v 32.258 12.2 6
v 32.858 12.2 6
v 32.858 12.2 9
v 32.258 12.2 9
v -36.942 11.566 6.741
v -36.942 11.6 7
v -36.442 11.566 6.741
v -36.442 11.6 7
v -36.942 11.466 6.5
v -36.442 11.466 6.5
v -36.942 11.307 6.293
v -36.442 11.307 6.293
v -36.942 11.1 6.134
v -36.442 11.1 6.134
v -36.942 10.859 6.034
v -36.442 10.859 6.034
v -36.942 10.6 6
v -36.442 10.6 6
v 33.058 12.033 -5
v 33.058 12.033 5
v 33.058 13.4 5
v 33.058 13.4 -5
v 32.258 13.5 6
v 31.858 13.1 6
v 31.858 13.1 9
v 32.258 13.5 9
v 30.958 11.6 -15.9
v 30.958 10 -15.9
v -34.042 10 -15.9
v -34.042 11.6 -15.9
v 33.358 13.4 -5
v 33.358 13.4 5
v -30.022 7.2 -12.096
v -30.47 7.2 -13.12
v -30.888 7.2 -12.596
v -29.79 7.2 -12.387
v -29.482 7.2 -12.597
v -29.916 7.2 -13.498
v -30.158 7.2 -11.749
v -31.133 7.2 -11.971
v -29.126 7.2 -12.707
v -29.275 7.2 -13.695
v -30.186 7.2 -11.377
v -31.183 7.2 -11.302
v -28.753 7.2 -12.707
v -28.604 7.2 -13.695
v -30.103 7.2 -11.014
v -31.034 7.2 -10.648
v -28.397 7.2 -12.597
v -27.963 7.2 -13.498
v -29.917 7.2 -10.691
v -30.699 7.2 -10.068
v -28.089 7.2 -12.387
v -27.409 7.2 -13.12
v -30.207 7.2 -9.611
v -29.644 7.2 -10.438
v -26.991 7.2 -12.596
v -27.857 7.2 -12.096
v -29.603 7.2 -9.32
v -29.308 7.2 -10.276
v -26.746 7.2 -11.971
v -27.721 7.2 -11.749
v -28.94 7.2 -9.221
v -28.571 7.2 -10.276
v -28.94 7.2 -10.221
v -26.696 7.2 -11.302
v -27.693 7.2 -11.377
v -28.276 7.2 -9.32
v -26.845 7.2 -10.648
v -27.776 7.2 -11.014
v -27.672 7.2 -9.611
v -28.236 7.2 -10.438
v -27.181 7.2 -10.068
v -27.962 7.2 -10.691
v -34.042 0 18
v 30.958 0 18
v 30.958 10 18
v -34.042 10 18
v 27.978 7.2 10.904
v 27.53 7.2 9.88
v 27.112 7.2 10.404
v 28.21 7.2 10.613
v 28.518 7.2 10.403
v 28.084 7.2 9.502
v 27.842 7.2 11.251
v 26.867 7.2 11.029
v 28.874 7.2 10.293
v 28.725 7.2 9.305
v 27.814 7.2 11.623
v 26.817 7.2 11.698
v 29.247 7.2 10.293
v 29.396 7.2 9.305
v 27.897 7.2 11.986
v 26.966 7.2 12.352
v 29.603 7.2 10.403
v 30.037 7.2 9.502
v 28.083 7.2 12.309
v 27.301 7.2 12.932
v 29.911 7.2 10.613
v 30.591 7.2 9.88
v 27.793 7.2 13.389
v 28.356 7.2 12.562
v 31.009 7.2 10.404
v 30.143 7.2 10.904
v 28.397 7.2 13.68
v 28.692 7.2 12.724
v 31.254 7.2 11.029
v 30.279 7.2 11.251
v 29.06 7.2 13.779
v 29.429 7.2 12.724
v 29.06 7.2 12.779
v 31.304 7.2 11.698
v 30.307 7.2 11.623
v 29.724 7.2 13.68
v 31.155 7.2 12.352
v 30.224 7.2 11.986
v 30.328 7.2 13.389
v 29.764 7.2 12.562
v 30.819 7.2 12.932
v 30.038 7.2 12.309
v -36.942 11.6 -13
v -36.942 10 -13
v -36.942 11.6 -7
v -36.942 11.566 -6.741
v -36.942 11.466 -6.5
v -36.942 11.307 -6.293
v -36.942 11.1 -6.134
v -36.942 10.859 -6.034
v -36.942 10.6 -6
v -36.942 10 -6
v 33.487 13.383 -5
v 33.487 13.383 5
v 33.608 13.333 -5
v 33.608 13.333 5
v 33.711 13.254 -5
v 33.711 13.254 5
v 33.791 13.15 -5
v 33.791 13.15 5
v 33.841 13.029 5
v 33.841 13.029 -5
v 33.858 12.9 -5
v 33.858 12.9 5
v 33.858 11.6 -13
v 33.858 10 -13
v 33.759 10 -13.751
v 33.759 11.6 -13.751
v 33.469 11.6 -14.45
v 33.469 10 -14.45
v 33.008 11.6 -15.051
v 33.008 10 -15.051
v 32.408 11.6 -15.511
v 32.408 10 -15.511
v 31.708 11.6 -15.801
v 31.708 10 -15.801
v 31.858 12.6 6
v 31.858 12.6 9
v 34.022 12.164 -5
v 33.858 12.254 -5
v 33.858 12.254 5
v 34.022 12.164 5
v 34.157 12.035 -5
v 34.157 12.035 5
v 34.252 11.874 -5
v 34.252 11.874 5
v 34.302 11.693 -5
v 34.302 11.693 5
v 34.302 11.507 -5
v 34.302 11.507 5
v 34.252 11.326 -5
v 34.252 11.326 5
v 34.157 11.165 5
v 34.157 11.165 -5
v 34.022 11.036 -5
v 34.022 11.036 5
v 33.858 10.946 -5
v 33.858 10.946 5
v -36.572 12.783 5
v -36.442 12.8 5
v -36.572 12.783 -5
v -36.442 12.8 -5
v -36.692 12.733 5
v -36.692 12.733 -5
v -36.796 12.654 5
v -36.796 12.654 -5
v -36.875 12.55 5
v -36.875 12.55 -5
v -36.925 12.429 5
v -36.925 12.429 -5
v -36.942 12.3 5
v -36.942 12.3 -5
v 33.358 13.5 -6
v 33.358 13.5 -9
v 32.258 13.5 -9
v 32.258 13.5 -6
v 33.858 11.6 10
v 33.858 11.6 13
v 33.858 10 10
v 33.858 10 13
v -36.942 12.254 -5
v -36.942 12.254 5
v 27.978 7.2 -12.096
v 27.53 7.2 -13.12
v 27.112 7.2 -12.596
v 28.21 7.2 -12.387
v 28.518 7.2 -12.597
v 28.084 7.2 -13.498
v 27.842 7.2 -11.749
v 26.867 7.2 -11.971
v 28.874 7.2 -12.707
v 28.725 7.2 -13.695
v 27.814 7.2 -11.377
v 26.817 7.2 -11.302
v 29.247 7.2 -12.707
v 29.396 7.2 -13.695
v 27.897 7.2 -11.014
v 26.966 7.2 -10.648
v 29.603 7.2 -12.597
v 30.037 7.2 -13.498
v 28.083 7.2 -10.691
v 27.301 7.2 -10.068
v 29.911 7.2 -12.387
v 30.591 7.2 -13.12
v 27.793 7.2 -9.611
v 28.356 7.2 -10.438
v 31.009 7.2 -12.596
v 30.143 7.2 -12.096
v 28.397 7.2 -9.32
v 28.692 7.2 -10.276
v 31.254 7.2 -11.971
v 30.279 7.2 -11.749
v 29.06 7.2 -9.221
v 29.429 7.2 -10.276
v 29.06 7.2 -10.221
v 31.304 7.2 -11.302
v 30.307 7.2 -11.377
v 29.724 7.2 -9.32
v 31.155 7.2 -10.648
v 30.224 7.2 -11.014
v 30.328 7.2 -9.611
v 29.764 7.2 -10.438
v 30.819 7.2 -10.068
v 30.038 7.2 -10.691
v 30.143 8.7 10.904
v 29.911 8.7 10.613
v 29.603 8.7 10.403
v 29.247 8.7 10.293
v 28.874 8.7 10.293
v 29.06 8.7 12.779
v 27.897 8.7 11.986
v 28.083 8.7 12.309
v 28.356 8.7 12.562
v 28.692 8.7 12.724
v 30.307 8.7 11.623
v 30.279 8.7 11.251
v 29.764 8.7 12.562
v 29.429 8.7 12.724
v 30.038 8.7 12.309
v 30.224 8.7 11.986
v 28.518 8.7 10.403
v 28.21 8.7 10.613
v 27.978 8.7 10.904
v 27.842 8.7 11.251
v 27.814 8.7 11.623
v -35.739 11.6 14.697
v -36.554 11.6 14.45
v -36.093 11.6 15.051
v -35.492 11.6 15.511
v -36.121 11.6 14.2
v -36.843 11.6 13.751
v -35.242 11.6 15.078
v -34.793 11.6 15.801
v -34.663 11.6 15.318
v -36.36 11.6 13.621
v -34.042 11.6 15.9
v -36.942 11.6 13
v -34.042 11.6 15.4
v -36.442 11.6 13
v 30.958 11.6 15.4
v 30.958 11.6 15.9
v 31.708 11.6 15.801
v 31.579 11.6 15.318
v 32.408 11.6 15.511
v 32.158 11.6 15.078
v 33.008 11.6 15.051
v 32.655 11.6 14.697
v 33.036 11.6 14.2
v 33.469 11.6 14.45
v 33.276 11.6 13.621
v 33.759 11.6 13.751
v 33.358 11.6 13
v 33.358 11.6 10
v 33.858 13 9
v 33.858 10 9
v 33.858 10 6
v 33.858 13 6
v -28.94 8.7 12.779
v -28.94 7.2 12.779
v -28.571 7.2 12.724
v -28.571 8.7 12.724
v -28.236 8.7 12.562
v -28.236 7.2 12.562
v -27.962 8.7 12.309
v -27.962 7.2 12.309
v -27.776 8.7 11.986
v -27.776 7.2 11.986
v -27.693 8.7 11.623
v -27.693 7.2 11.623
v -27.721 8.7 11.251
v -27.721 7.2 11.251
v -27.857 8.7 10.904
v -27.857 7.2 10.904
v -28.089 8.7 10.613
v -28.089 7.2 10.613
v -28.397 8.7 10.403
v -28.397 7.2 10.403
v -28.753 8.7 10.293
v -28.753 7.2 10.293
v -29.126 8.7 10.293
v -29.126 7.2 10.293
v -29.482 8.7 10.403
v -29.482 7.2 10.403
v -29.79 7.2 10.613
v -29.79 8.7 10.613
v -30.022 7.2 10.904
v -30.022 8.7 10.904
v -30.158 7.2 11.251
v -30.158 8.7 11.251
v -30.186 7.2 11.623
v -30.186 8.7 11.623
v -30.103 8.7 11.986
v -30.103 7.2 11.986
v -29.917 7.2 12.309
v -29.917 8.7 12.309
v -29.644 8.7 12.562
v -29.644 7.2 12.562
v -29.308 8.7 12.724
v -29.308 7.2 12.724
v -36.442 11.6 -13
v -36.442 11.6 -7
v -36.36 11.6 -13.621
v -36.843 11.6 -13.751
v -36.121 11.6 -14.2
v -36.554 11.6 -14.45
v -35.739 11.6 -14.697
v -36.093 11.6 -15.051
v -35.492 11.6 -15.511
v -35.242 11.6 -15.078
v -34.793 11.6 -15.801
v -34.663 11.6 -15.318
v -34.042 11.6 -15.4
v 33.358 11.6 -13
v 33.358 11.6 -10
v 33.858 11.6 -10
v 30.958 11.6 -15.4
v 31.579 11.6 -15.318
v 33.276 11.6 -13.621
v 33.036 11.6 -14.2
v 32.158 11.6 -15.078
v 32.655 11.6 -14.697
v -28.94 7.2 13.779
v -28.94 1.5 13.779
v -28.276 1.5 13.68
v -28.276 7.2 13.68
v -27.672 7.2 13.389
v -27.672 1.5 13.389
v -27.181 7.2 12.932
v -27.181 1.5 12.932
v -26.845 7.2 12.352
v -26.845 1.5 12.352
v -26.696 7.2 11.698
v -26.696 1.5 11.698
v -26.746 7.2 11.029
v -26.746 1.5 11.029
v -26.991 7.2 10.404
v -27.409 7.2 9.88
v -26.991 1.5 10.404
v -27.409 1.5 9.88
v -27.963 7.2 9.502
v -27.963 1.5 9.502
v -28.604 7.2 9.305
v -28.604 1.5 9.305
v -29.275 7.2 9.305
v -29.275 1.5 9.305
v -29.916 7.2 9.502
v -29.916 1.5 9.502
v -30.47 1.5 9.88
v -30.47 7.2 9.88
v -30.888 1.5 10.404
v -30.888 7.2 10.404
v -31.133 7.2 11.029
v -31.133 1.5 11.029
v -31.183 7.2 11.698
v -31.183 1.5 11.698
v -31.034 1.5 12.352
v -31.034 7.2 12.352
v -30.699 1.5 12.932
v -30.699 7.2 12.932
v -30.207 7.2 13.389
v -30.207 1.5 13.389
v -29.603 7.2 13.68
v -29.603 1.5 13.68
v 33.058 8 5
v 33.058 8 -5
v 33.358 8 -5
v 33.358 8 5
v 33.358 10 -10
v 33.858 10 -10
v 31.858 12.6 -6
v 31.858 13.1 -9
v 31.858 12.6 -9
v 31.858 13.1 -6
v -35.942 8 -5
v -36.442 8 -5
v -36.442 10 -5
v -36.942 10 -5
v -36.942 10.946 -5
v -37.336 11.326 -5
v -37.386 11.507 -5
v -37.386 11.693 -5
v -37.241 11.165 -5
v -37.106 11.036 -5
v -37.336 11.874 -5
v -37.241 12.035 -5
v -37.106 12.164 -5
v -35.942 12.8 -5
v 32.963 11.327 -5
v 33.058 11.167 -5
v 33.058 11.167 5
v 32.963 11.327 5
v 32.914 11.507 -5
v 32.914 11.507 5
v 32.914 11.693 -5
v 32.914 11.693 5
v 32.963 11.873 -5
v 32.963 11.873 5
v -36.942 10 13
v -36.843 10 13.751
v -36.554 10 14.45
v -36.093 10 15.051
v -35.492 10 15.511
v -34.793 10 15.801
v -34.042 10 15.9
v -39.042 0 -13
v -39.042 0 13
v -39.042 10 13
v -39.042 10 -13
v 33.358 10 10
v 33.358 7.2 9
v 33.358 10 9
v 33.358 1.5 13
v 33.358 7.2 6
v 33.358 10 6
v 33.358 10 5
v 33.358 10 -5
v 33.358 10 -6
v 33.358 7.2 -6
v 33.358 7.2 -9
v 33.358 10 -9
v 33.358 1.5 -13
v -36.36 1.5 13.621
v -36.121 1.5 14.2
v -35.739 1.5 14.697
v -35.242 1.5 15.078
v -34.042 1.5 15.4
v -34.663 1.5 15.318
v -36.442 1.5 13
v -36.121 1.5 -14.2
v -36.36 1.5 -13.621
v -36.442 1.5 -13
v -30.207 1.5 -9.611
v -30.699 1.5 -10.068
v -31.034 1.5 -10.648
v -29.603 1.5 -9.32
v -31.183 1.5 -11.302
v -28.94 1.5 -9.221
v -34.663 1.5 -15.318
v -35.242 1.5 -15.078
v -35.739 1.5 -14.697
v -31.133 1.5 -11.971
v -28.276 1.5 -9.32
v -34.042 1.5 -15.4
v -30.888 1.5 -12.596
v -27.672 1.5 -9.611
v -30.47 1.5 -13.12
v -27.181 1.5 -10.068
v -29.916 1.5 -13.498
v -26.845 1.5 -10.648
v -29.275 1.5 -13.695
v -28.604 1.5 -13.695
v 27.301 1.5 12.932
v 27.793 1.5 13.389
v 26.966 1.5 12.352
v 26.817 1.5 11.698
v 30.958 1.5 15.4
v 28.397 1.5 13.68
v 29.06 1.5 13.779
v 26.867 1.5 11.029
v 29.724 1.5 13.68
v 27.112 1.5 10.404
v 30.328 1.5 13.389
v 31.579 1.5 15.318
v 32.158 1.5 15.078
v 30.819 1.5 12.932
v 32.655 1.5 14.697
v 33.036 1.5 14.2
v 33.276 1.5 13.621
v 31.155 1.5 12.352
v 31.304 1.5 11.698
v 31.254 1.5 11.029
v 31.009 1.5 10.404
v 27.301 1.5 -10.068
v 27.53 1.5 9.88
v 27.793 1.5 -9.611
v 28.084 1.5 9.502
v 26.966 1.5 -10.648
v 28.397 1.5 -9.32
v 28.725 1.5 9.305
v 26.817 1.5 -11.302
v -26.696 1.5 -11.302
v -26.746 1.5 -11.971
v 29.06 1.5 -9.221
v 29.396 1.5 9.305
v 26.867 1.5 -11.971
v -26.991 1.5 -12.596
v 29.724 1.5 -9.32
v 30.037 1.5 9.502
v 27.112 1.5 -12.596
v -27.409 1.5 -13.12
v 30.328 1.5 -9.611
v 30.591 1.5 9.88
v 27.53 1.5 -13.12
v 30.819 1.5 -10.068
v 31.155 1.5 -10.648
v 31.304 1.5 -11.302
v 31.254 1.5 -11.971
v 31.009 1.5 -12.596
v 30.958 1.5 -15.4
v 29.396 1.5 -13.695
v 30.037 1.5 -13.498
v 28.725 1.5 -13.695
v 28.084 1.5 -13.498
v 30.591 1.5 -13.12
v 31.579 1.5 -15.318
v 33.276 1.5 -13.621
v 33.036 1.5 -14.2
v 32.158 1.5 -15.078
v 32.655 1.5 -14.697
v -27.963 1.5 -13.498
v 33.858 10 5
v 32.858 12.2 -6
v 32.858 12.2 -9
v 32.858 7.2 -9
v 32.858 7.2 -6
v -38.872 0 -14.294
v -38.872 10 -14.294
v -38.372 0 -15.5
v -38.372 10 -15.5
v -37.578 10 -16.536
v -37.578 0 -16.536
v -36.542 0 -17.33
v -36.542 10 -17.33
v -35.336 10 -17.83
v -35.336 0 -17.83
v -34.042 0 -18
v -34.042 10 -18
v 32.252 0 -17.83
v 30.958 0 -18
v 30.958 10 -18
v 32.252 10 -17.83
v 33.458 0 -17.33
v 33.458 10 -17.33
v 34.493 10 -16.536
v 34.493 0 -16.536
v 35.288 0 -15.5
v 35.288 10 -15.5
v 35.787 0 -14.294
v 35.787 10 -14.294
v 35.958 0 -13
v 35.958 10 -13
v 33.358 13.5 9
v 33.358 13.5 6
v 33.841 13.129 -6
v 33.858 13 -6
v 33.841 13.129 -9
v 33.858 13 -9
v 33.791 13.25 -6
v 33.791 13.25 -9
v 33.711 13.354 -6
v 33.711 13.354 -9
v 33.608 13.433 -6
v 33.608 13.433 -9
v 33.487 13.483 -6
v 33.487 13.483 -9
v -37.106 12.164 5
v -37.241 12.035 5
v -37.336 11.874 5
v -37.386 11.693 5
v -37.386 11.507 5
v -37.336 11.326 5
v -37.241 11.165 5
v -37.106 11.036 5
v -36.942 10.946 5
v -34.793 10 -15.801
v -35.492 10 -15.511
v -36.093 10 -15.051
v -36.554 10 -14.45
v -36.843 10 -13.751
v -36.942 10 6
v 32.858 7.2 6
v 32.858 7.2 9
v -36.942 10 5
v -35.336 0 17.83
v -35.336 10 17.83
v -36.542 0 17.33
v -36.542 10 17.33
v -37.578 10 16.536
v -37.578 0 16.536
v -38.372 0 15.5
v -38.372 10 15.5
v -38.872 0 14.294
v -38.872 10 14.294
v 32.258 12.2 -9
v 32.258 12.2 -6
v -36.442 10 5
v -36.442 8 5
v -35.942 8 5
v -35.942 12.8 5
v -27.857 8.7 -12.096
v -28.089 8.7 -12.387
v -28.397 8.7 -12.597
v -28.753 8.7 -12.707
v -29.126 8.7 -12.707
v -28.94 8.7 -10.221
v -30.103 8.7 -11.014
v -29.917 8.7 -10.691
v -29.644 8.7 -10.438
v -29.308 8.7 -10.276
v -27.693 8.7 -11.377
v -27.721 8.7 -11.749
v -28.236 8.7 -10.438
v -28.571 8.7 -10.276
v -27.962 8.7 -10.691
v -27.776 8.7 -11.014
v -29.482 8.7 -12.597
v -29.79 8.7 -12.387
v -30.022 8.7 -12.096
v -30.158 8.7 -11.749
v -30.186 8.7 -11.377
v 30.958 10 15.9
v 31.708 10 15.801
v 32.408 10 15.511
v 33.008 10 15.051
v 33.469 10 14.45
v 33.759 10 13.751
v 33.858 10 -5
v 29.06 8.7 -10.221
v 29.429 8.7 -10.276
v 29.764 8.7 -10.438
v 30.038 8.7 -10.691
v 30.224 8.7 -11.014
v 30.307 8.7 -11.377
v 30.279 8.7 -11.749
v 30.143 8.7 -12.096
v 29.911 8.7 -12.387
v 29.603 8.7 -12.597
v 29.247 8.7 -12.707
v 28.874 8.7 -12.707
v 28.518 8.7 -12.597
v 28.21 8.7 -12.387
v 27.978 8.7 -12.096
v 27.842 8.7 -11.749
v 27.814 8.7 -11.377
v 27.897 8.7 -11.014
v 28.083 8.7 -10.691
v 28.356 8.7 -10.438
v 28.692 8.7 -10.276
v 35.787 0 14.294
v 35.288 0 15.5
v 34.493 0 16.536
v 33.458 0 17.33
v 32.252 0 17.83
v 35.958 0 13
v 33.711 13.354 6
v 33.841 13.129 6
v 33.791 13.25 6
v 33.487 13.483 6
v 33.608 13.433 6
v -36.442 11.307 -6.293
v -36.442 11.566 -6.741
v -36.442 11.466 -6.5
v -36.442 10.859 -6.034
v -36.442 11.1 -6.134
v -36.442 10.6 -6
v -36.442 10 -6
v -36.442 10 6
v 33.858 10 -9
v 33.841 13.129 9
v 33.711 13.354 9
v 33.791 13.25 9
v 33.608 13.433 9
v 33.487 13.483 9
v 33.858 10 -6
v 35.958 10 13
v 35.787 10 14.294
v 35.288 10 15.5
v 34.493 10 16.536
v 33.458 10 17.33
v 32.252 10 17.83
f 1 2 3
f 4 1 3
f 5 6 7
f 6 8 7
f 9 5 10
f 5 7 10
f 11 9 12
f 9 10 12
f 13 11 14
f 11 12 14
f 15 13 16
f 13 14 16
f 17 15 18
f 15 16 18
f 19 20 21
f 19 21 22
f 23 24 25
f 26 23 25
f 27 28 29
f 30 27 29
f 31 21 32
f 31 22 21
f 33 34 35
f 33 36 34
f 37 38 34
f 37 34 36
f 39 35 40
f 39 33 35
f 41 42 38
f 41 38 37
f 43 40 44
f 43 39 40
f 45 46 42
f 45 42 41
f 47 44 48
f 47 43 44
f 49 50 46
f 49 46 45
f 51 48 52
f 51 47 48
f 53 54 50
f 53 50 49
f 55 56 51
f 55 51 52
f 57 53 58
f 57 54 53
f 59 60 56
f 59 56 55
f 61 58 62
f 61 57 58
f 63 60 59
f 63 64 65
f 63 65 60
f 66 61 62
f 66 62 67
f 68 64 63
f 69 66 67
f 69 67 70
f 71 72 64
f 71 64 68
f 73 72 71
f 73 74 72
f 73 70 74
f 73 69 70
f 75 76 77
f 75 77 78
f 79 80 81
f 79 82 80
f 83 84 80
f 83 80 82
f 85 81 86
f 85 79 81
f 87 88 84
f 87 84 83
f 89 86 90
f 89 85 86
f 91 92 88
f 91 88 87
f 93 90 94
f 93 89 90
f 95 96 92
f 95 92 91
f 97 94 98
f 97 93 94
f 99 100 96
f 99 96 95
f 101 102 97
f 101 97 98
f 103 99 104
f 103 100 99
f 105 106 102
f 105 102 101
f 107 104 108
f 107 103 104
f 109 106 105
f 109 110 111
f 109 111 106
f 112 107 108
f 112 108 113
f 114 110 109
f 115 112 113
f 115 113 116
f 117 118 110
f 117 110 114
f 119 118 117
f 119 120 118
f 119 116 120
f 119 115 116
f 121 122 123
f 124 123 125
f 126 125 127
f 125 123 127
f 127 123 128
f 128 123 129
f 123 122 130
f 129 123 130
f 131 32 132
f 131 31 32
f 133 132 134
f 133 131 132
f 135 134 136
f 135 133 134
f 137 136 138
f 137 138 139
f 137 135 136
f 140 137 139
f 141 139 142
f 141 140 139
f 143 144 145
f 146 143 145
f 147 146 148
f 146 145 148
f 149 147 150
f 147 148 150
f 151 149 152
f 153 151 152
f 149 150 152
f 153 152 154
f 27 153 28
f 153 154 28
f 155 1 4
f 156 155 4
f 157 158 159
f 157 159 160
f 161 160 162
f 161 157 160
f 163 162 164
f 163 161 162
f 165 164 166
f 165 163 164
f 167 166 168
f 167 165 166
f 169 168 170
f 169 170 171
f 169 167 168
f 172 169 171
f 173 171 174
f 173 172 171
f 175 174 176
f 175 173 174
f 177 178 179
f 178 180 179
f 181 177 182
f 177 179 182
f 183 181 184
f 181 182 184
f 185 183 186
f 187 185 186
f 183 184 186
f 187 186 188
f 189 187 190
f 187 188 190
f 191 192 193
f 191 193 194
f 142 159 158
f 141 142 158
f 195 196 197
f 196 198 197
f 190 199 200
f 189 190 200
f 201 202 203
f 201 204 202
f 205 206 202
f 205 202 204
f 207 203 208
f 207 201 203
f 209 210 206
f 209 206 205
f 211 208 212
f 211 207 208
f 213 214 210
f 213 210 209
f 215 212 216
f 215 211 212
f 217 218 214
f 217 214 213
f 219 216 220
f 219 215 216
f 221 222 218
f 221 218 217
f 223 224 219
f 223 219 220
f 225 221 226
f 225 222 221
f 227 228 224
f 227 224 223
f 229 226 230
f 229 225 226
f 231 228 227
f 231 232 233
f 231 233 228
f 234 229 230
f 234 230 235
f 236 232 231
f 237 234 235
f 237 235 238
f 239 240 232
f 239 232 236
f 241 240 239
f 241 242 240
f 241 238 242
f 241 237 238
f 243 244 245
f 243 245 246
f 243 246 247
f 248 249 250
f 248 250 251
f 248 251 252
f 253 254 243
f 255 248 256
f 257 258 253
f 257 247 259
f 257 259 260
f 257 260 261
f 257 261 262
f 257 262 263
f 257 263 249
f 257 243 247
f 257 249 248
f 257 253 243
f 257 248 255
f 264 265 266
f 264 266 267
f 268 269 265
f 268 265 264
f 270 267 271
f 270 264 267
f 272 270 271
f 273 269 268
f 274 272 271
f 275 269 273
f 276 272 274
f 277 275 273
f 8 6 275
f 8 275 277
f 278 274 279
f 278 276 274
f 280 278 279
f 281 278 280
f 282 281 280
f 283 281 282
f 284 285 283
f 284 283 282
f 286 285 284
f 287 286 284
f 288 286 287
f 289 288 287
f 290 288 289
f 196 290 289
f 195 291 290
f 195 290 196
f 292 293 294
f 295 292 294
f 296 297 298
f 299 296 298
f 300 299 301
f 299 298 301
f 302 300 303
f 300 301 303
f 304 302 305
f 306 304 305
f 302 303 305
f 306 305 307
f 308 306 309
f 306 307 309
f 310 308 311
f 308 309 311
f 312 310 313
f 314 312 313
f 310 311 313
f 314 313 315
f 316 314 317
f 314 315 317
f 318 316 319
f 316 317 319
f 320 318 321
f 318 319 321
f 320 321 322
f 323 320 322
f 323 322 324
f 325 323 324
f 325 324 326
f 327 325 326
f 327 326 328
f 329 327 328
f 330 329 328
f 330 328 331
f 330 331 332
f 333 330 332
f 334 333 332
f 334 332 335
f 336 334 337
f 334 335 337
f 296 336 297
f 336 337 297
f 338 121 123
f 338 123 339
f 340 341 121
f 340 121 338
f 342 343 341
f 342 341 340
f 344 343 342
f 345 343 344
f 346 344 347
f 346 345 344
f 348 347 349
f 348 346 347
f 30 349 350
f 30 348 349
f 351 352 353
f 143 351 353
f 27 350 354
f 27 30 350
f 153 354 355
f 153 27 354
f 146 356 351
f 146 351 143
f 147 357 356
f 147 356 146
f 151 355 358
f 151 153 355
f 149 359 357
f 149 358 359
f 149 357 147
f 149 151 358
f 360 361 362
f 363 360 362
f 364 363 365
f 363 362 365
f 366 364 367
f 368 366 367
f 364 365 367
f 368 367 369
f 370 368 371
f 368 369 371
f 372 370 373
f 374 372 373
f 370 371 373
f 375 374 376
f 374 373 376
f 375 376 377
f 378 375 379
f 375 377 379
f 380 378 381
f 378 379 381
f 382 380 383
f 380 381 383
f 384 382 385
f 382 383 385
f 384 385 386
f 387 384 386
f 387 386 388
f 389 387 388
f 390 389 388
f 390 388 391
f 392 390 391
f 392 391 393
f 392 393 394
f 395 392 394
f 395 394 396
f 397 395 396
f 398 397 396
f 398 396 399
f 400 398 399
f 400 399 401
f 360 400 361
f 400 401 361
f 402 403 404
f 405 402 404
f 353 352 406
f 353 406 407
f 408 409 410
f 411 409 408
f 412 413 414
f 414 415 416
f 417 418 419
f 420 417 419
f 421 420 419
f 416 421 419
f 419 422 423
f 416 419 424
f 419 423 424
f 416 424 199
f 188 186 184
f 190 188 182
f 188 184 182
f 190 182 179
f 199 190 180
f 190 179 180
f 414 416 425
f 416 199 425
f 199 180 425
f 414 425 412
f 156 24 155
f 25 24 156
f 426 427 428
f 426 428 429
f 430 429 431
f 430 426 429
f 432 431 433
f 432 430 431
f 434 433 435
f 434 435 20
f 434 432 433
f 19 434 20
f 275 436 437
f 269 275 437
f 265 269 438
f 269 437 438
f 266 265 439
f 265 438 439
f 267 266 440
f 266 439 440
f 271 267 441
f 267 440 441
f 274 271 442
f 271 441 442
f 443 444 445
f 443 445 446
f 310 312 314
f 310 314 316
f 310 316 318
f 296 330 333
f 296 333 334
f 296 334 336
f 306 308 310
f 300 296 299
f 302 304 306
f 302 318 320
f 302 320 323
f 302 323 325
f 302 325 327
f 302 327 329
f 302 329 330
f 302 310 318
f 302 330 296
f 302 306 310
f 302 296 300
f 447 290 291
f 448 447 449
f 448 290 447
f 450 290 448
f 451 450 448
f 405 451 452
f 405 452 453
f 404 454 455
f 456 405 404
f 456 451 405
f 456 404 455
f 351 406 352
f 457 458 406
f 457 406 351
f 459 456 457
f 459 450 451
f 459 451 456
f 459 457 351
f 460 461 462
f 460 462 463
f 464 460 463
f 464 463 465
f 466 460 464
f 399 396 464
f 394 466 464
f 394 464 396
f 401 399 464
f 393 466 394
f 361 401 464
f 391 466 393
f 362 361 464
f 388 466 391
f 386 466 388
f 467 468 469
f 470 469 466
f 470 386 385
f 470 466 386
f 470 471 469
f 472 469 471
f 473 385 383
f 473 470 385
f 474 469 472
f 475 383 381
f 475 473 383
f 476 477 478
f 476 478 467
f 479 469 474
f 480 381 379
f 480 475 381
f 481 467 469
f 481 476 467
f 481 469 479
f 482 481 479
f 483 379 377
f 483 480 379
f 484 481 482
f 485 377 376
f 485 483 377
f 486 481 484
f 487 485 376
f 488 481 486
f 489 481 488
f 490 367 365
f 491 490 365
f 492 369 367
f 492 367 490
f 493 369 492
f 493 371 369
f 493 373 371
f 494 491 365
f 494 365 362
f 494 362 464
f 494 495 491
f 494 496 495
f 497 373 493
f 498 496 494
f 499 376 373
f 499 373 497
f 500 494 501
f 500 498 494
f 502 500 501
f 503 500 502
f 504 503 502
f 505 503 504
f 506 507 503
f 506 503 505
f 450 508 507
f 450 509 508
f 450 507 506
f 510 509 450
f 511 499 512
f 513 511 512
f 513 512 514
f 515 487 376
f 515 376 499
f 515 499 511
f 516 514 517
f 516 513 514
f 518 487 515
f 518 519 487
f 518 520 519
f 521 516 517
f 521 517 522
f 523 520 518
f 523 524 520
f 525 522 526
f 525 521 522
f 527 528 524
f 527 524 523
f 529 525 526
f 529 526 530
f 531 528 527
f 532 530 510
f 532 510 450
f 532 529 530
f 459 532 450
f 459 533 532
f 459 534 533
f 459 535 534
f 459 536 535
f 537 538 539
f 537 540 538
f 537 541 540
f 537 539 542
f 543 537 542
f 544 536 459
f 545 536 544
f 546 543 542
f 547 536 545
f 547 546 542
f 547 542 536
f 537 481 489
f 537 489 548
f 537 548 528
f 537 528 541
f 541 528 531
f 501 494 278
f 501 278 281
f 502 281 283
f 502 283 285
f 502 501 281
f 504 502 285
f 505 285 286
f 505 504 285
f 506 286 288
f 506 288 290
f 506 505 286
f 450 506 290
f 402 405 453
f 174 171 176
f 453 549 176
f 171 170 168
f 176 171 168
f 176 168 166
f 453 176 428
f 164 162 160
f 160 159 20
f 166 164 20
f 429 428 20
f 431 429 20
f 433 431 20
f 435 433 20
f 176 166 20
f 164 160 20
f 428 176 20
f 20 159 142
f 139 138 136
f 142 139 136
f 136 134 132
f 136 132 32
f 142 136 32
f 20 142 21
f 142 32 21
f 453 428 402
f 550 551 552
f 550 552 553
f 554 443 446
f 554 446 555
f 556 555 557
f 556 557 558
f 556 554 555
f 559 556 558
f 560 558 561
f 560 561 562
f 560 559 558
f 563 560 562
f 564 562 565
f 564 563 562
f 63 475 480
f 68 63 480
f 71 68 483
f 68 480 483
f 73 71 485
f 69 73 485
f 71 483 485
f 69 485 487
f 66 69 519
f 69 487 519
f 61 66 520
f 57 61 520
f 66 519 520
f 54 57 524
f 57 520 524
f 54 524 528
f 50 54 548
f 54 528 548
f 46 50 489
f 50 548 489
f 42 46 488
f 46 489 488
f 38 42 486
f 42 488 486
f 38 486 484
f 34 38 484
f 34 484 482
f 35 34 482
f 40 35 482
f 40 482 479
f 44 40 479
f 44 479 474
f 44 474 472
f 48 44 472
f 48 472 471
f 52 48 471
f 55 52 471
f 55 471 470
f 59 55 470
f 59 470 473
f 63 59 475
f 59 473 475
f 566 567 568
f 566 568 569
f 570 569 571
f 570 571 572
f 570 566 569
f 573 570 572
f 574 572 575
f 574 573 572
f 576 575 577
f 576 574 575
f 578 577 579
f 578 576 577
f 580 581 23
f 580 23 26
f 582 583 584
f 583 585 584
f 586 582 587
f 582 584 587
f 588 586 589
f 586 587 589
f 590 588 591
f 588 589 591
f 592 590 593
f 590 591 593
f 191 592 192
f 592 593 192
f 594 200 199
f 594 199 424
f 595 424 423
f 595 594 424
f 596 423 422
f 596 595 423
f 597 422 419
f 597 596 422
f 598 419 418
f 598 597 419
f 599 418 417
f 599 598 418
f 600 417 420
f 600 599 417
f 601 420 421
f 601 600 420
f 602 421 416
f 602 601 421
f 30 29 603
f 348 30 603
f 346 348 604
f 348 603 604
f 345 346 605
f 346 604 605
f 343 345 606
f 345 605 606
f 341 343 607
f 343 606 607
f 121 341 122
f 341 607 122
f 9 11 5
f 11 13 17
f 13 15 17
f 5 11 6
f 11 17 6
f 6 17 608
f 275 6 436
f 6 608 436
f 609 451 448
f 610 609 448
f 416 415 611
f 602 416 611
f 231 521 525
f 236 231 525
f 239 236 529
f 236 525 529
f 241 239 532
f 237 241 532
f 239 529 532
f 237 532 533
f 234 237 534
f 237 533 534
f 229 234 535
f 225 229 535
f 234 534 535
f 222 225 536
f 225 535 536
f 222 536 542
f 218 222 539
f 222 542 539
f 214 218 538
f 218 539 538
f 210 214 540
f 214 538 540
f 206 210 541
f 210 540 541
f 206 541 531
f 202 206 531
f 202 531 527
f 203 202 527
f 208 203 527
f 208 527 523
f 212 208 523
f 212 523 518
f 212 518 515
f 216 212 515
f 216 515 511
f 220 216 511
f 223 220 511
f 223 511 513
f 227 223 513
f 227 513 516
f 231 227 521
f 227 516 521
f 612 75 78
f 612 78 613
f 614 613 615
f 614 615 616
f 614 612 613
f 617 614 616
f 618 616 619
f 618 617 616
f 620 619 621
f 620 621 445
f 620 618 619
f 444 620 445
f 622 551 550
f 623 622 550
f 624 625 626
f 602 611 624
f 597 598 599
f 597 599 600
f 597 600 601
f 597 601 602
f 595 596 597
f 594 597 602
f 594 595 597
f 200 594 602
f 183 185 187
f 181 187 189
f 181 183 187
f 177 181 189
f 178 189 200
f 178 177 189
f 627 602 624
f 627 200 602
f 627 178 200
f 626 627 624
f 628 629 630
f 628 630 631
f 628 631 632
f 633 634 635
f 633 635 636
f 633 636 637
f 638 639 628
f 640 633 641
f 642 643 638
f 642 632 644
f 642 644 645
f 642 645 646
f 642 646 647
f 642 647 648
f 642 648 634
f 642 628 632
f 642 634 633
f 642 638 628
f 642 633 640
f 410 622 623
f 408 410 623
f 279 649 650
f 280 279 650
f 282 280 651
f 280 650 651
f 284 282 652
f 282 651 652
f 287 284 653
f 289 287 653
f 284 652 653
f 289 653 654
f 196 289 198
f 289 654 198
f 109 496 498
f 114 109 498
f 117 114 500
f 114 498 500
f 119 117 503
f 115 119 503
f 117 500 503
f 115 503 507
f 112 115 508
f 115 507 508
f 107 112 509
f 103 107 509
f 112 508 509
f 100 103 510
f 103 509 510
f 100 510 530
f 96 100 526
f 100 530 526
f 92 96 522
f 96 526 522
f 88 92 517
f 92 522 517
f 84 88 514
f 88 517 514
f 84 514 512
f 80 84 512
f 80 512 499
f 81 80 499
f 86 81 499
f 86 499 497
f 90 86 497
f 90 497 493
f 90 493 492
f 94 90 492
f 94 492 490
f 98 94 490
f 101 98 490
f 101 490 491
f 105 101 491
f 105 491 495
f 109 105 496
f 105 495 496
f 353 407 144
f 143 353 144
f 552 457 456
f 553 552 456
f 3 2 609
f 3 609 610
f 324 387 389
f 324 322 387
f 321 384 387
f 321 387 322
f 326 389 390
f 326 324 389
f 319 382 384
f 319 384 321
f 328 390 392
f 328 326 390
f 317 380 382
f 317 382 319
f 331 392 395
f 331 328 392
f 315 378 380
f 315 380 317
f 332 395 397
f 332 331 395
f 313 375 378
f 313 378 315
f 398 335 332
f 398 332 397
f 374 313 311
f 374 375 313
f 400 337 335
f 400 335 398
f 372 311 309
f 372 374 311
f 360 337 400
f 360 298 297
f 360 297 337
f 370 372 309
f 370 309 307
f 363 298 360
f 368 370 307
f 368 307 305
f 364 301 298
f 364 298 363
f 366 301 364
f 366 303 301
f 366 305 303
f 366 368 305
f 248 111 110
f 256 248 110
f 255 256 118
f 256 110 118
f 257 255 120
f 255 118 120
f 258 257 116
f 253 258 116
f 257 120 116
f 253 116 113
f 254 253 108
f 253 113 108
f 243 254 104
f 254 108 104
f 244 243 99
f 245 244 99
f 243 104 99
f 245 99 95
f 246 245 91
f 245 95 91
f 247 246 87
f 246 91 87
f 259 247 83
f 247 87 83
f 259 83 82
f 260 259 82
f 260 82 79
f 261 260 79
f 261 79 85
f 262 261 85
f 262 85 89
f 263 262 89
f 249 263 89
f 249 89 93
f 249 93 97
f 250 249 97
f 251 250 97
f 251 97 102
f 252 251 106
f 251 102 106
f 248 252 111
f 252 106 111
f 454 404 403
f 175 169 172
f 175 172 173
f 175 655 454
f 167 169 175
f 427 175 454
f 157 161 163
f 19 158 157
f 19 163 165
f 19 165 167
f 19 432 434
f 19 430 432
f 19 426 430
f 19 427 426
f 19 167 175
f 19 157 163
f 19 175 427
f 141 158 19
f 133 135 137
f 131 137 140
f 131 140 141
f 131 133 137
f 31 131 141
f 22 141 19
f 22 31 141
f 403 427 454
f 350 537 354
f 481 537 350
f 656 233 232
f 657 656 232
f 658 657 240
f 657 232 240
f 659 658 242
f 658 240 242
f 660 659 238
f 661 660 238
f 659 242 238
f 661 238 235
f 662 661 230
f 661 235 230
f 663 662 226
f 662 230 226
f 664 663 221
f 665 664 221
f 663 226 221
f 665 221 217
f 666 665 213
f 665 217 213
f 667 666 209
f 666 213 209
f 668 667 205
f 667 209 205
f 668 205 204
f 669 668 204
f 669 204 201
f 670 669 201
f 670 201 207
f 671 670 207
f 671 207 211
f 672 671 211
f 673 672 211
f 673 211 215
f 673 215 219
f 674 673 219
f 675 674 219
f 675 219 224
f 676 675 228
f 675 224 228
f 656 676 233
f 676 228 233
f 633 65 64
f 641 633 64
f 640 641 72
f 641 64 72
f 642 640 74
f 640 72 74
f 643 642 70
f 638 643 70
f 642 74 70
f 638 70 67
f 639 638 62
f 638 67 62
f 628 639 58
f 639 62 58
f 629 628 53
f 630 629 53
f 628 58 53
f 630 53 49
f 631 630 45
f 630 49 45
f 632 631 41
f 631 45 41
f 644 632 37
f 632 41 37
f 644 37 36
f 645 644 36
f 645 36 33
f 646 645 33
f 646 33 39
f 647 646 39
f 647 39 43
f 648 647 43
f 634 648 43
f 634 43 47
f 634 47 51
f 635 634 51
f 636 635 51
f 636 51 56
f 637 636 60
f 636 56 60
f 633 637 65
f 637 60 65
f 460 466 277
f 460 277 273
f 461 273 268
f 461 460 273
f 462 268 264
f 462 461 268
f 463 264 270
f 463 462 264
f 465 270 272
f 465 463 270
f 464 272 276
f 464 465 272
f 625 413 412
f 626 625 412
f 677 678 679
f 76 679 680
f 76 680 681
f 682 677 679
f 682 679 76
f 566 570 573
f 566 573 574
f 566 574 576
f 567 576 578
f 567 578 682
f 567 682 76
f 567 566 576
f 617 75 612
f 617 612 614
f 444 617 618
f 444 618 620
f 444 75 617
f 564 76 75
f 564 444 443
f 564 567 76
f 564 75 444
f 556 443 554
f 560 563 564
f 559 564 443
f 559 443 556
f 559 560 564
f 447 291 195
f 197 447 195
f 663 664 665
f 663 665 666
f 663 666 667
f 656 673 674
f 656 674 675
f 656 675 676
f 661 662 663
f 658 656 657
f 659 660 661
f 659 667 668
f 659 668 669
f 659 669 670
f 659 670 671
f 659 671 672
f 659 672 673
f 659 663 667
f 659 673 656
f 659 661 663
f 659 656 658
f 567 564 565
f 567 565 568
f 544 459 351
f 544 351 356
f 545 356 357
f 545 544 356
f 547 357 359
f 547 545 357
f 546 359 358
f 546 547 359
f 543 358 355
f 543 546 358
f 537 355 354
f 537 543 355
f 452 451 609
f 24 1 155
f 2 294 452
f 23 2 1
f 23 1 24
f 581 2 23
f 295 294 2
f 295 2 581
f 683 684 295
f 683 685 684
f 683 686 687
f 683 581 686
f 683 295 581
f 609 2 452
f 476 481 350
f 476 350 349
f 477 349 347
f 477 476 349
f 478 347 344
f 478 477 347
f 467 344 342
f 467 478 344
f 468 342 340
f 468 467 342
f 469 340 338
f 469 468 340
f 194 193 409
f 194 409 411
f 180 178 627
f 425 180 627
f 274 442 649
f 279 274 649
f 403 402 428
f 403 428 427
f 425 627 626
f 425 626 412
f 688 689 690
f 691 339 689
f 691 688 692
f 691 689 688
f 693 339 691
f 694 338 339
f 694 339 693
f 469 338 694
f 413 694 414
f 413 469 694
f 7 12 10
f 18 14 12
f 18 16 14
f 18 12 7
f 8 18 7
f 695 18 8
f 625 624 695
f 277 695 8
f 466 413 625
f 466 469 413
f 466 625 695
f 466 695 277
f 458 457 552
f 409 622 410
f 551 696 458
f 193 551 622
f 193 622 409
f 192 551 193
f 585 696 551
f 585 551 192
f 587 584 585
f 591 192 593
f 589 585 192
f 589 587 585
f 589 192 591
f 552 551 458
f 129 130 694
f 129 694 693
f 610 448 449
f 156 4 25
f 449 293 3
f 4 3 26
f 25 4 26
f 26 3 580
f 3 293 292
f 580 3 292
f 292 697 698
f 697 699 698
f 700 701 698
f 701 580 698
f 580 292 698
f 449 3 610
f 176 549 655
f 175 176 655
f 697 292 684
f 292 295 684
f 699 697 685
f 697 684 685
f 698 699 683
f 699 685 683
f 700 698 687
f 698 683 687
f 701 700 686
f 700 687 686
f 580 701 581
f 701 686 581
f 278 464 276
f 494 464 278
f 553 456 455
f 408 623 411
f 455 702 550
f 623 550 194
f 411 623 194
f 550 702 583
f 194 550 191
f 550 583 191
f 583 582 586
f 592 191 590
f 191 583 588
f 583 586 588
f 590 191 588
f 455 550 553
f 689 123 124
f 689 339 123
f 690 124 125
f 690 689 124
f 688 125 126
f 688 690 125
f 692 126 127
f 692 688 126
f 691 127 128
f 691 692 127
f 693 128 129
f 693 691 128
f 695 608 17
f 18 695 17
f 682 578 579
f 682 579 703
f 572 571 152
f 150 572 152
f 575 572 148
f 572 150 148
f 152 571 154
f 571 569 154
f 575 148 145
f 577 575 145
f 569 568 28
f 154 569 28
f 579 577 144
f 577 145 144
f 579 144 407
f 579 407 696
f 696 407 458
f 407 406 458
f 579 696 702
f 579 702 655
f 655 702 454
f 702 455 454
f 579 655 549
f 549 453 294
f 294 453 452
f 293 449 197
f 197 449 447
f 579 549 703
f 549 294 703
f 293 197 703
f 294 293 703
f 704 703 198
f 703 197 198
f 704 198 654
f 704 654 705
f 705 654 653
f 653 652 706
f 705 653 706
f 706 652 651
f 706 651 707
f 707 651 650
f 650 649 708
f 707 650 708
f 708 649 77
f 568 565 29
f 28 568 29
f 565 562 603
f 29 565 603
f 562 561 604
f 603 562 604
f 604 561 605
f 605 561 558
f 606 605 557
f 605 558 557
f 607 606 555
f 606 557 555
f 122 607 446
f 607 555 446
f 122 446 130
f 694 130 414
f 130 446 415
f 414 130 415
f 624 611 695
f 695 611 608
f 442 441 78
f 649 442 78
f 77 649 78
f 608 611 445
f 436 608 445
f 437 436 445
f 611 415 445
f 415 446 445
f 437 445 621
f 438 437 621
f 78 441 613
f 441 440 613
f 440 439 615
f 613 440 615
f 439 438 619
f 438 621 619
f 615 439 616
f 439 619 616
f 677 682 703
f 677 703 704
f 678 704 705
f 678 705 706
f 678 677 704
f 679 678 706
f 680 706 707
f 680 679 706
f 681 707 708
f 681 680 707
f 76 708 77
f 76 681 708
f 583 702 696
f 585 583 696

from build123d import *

# Parameters (mm, degrees)
EXTRUDE_2_DEPTH       = 10
EXTRUDE_4_DEPTH       = 1.6
SKETCH_7_W            = 0.5
SKETCH_7_H            = 10
EXTRUDE_8_DEPTH       = 2.8
SKETCH_8_R            = 0.7
EXTRUDE_9_DEPTH       = 10
FILLET_1_R            = 0.5
SKETCH_11_W           = 1
SKETCH_11_H           = 1.6
CUT_EXTRUDE_1_DEPTH   = 1.2
FILLET_2_R            = 1
SKETCH_13_W           = 0.5
SKETCH_13_H           = 10
EXTRUDE_10_DEPTH      = 2.8
CUT_EXTRUDE_START     = -8.5
CUT_EXTRUDE_2_DEPTH   = 8.5
SKETCH_13_2_W         = 0.5
SKETCH_13_2_H         = 10
EXTRUDE_11_DEPTH      = 2
EXTRUDE_12_DEPTH      = 1.6
EXTRUDE_12_DEPTH_BACK = 2
SKETCH_5_W            = 0.3
SKETCH_5_H            = 10
SKETCH_15_R           = 2.25
EXTRUDE_13_DEPTH      = 5.7
SKETCH_16_R           = 1.25
EXTRUDE_14_DEPTH      = 1.5
SKETCH_17_W           = 0.5
SKETCH_17_H           = 1
CUT_EXTRUDE_3_DEPTH   = 1.6
SKETCH_19_W           = 0.8
SKETCH_19_H           = 10
EXTRUDE_15_DEPTH      = 1.8
SKETCH_20_R           = 0.7
EXTRUDE_16_DEPTH      = 10
FILLET_4_R            = 0.5
SKETCH_21_W           = 0.5
SKETCH_21_H           = 3
EXTRUDE_17_DEPTH      = 1.9
SKETCH_22_W           = 3
SKETCH_22_H           = 6.3
EXTRUDE_23_DEPTH      = 0.5
FILLET_12_R           = 0.5
SKETCH_29_W           = 0.5
SKETCH_29_H           = 1
CUT_EXTRUDE_5_DEPTH   = 1.6
SKETCH_30_W           = 3
SKETCH_30_H           = 1.3
EXTRUDE_26_DEPTH      = 1
CHAMFER_7_SIZE        = 0.4


with BuildPart() as part:
    # case 2 → 凸台-拉伸2 (new body)
    with BuildSketch(Plane(origin=(0, 0, 0), x_dir=(1, 0, 0), z_dir=(0, 1, 0))):
        with BuildLine():
            Line((-34.042196447, 18), (30.957803553, 18))
            ThreePointArc((30.957803553, 18), (34.493337459, 16.535533906), (35.957803553, 13))
            Line((35.957803553, 13), (35.957803553, -13))
            ThreePointArc((35.957803553, -13), (34.493337459, -16.535533906), (30.957803553, -18))
            Line((30.957803553, -18), (-34.042196447, -18))
            ThreePointArc((-34.042196447, -18), (-37.577730353, -16.535533906), (-39.042196447, -13))
            Line((-39.042196447, -13), (-39.042196447, 13))
            ThreePointArc((-39.042196447, 13), (-37.577730353, 16.535533906), (-34.042196447, 18))
        make_face()
    extrude(amount=EXTRUDE_2_DEPTH)

    # 草图3 → 凸台-拉伸4 (add)
    with BuildSketch(Plane(origin=(0, 10, 0), x_dir=(1, 0, 0), z_dir=(0, 1, 0))):
        with BuildLine():
            Line((-36.942196447, 13), (-36.942196447, -13))
            ThreePointArc((-36.942196447, -13), (-36.092806113, -15.050609665), (-34.042196447, -15.9))
            Line((-34.042196447, -15.9), (30.957803553, -15.9))
            ThreePointArc((30.957803553, -15.9), (33.008413218, -15.050609665), (33.857803553, -13))
            Line((33.857803553, -13), (33.857803553, 13))
            ThreePointArc((33.857803553, 13), (33.008413218, 15.050609665), (30.957803553, 15.9))
            Line((30.957803553, 15.9), (-34.042196447, 15.9))
            ThreePointArc((-34.042196447, 15.9), (-36.092806113, 15.050609665), (-36.942196447, 13))
        make_face()
        with BuildLine():
            Line((-34.042196447, -15.4), (30.957803553, -15.4))
            ThreePointArc((30.957803553, -15.4), (32.654859828, -14.697056275), (33.357803553, -13))
            Line((33.357803553, -13), (33.357803553, 13))
            ThreePointArc((33.357803553, 13), (32.654859828, 14.697056275), (30.957803553, 15.4))
            Line((30.957803553, 15.4), (-34.042196447, 15.4))
            ThreePointArc((-34.042196447, 15.4), (-35.739252722, 14.697056275), (-36.442196447, 13))
            Line((-36.442196447, 13), (-36.442196447, -13))
            ThreePointArc((-36.442196447, -13), (-35.739252722, -14.697056275), (-34.042196447, -15.4))
        make_face(mode=Mode.SUBTRACT)
    extrude(amount=EXTRUDE_4_DEPTH)

    # 草图7 → 凸台-拉伸8 (add)
    with BuildSketch(Plane(origin=(0, 10, 0), x_dir=(1, 0, 0), z_dir=(0, 1, 0))):
        with Locations((-36.692196447, 0)):
            Rectangle(SKETCH_7_W, SKETCH_7_H)
    extrude(amount=EXTRUDE_8_DEPTH)

    # 草图8 → 凸台-拉伸9 (add)
    with BuildSketch(Plane.XY.offset(5)):
        with Locations((-36.692196447, 11.6)):
            Circle(SKETCH_8_R)
    extrude(amount=-EXTRUDE_9_DEPTH)

    # 圆角1
    fillet_1_edges = [part.edges().sort_by_distance(p)[0] for p in [
        (-36.942196447, 12.8, 0),
    ]]
    fillet(fillet_1_edges, radius=FILLET_1_R - 0.0001)  # a hair under: the kernel refuses the full size

    # 草图11 → 切除-拉伸1 (cut)
    with BuildSketch(Plane.ZY.offset(36.942196447)):
        with Locations((5.5, 10.8)):
            Rectangle(SKETCH_11_W, SKETCH_11_H)
        with Locations((-5.5, 10.8)):
            Rectangle(SKETCH_11_W, SKETCH_11_H)
    extrude(amount=-CUT_EXTRUDE_1_DEPTH, mode=Mode.SUBTRACT)

    # 圆角2
    fillet_2_edges = [part.edges().sort_by_distance(p)[0] for p in [
        (-36.692196447, 11.6, 6),
        (-36.692196447, 11.6, -6),
    ]]
    fillet(fillet_2_edges, radius=FILLET_2_R)

    # 草图13 → 凸台-拉伸10 (add)
    with BuildSketch(Plane(origin=(0, 10, 0), x_dir=(1, 0, 0), z_dir=(0, 1, 0))):
        with Locations((-36.192196447, 0)):
            Rectangle(SKETCH_13_W, SKETCH_13_H)
    extrude(amount=EXTRUDE_10_DEPTH)

    # 草图14 → 切除-拉伸2 (cut)
    with BuildSketch(Plane(origin=(0, 10, 0), x_dir=(1, 0, 0), z_dir=(0, 1, 0)).offset(CUT_EXTRUDE_START)):
        with BuildLine():
            Line((-34.042196447, -15.4), (30.957803553, -15.4))
            ThreePointArc((30.957803553, -15.4), (32.654859828, -14.697056275), (33.357803553, -13))
            Line((33.357803553, -13), (33.357803553, 13))
            ThreePointArc((33.357803553, 13), (32.654859828, 14.697056275), (30.957803553, 15.4))
            Line((30.957803553, 15.4), (-34.042196447, 15.4))
            ThreePointArc((-34.042196447, 15.4), (-35.739252722, 14.697056275), (-36.442196447, 13))
            Line((-36.442196447, 13), (-36.442196447, -13))
            ThreePointArc((-36.442196447, -13), (-35.739252722, -14.697056275), (-34.042196447, -15.4))
        make_face()
    extrude(amount=CUT_EXTRUDE_2_DEPTH, mode=Mode.SUBTRACT)

    # 草图13<2> → 凸台-拉伸11 (add)
    with BuildSketch(Plane(origin=(0, 10, 0), x_dir=(1, 0, 0), z_dir=(0, 1, 0))):
        with Locations((-36.192196447, 0)):
            Rectangle(SKETCH_13_2_W, SKETCH_13_2_H)
    extrude(amount=-EXTRUDE_11_DEPTH)

    # 草图5 → 凸台-拉伸12 (add, two sides: drawn at the far end of the back side and taken through both)
    with BuildSketch(Plane(origin=(0, 10, 0), x_dir=(1, 0, 0), z_dir=(0, 1, 0)).offset(-EXTRUDE_12_DEPTH_BACK)):
        with Locations((33.207803553, 0)):
            Rectangle(SKETCH_5_W, SKETCH_5_H)
    extrude(amount=EXTRUDE_12_DEPTH + EXTRUDE_12_DEPTH_BACK)

    # 草图15 → 凸台-拉伸13 (add)
    with BuildSketch(Plane(origin=(0, 1.5, 0), x_dir=(1, 0, 0), z_dir=(0, 1, 0))):
        with Locations(Location((29.060337171, -11.529492838, 0), (0, 0, 270))):
            Circle(SKETCH_15_R)
        with Locations(Location((-28.939662829, -11.529492838, 0), (0, 0, 270))):
            Circle(SKETCH_15_R)
        with Locations(Location((29.060337171, 11.470507162, 0), (0, 0, 270))):
            Circle(SKETCH_15_R)
        with Locations(Location((-28.939662829, 11.470507162, 0), (0, 0, 270))):
            Circle(SKETCH_15_R)
    extrude(amount=EXTRUDE_13_DEPTH)

    # 草图16 → 凸台-拉伸14 (add)
    with BuildSketch(Plane(origin=(0, 7.2, 0), x_dir=(1, 0, 0), z_dir=(0, 1, 0))):
        with Locations(Location((29.060337171, -11.529492838, 0), (0, 0, 270))):
            Circle(SKETCH_16_R)
        with Locations(Location((29.060337171, 11.470507162, 0), (0, 0, 270))):
            Circle(SKETCH_16_R)
        with Locations(Location((-28.939662829, -11.529492838, 0), (0, 0, 270))):
            Circle(SKETCH_16_R)
        with Locations(Location((-28.939662829, 11.470507162, 0), (0, 0, 270))):
            Circle(SKETCH_16_R)
    extrude(amount=EXTRUDE_14_DEPTH)

    # 草图17 → 切除-拉伸3 (cut)
    with BuildSketch(Plane(origin=(0, 11.6, 0), x_dir=(1, 0, 0), z_dir=(0, 1, 0))):
        with Locations((33.607803553, -5.5)):
            Rectangle(SKETCH_17_W, SKETCH_17_H)
        with Locations((33.607803553, 5.5)):
            Rectangle(SKETCH_17_W, SKETCH_17_H)
    extrude(amount=-CUT_EXTRUDE_3_DEPTH, mode=Mode.SUBTRACT)

    # 草图19 → 凸台-拉伸15 (add)
    with BuildSketch(Plane(origin=(0, 11.6, 0), x_dir=(1, 0, 0), z_dir=(0, 1, 0))):
        with Locations((33.457803553, 0)):
            Rectangle(SKETCH_19_W, SKETCH_19_H)
    extrude(amount=EXTRUDE_15_DEPTH)

    # 草图20 → 凸台-拉伸16 (add)
    with BuildSketch(Plane(origin=(0, 0, -5), x_dir=(-1, 0, 0), z_dir=(0, 0, -1))):
        with Locations((-33.607803553, 11.6)):
            Circle(SKETCH_20_R)
    extrude(amount=-EXTRUDE_16_DEPTH)

    # 圆角4
    fillet_4_edges = [part.edges().sort_by_distance(p)[0] for p in [
        (33.857803553, 13.4, 0),
    ]]
    fillet(fillet_4_edges, radius=FILLET_4_R)

    # 草图21 → 凸台-拉伸17 (add)
    with BuildSketch(Plane(origin=(0, 11.6, 0), x_dir=(1, 0, 0), z_dir=(0, 1, 0))):
        with Locations((33.607803553, -7.5)):
            Rectangle(SKETCH_21_W, SKETCH_21_H)
        with Locations((33.607803553, 7.5)):
            Rectangle(SKETCH_21_W, SKETCH_21_H)
    extrude(amount=EXTRUDE_17_DEPTH)

    # 草图22 → 凸台-拉伸23 (add)
    with BuildSketch(Plane.ZY.offset(-33.357803553)):
        with Locations((-7.5, 10.35)):
            Rectangle(SKETCH_22_W, SKETCH_22_H)
        with Locations((7.5, 10.35)):
            Rectangle(SKETCH_22_W, SKETCH_22_H)
    extrude(amount=EXTRUDE_23_DEPTH)

    # 圆角12
    fillet_12_edges = [part.edges().sort_by_distance(p)[0] for p in [
        (33.857803553, 13.5, 7.5),
        (33.857803553, 13.5, -7.5),
    ]]
    fillet(fillet_12_edges, radius=FILLET_12_R)

    # 草图29 → 切除-拉伸5 (cut)
    with BuildSketch(Plane(origin=(0, 11.6, 0), x_dir=(1, 0, 0), z_dir=(0, 1, 0))):
        with Locations((33.607803553, -9.5)):
            Rectangle(SKETCH_29_W, SKETCH_29_H)
        with Locations((33.607803553, 9.5)):
            Rectangle(SKETCH_29_W, SKETCH_29_H)
    extrude(amount=-CUT_EXTRUDE_5_DEPTH, mode=Mode.SUBTRACT)

    # 草图30 → 凸台-拉伸26 (add)
    with BuildSketch(Plane.ZY.offset(-32.857803553)):
        with Locations((7.5, 12.85)):
            Rectangle(SKETCH_30_W, SKETCH_30_H)
        with Locations((-7.5, 12.85)):
            Rectangle(SKETCH_30_W, SKETCH_30_H)
    extrude(amount=EXTRUDE_26_DEPTH)

    # 倒角7
    chamfer_7_edges = [part.edges().sort_by_distance(p)[0] for p in [
        (31.857803553, 12.2, 7.5),
        (31.857803553, 13.5, 7.5),
        (31.857803553, 12.2, -7.5),
        (31.857803553, 13.5, -7.5),
    ]]
    chamfer(chamfer_7_edges, length=CHAMFER_7_SIZE)


solid = part.part
